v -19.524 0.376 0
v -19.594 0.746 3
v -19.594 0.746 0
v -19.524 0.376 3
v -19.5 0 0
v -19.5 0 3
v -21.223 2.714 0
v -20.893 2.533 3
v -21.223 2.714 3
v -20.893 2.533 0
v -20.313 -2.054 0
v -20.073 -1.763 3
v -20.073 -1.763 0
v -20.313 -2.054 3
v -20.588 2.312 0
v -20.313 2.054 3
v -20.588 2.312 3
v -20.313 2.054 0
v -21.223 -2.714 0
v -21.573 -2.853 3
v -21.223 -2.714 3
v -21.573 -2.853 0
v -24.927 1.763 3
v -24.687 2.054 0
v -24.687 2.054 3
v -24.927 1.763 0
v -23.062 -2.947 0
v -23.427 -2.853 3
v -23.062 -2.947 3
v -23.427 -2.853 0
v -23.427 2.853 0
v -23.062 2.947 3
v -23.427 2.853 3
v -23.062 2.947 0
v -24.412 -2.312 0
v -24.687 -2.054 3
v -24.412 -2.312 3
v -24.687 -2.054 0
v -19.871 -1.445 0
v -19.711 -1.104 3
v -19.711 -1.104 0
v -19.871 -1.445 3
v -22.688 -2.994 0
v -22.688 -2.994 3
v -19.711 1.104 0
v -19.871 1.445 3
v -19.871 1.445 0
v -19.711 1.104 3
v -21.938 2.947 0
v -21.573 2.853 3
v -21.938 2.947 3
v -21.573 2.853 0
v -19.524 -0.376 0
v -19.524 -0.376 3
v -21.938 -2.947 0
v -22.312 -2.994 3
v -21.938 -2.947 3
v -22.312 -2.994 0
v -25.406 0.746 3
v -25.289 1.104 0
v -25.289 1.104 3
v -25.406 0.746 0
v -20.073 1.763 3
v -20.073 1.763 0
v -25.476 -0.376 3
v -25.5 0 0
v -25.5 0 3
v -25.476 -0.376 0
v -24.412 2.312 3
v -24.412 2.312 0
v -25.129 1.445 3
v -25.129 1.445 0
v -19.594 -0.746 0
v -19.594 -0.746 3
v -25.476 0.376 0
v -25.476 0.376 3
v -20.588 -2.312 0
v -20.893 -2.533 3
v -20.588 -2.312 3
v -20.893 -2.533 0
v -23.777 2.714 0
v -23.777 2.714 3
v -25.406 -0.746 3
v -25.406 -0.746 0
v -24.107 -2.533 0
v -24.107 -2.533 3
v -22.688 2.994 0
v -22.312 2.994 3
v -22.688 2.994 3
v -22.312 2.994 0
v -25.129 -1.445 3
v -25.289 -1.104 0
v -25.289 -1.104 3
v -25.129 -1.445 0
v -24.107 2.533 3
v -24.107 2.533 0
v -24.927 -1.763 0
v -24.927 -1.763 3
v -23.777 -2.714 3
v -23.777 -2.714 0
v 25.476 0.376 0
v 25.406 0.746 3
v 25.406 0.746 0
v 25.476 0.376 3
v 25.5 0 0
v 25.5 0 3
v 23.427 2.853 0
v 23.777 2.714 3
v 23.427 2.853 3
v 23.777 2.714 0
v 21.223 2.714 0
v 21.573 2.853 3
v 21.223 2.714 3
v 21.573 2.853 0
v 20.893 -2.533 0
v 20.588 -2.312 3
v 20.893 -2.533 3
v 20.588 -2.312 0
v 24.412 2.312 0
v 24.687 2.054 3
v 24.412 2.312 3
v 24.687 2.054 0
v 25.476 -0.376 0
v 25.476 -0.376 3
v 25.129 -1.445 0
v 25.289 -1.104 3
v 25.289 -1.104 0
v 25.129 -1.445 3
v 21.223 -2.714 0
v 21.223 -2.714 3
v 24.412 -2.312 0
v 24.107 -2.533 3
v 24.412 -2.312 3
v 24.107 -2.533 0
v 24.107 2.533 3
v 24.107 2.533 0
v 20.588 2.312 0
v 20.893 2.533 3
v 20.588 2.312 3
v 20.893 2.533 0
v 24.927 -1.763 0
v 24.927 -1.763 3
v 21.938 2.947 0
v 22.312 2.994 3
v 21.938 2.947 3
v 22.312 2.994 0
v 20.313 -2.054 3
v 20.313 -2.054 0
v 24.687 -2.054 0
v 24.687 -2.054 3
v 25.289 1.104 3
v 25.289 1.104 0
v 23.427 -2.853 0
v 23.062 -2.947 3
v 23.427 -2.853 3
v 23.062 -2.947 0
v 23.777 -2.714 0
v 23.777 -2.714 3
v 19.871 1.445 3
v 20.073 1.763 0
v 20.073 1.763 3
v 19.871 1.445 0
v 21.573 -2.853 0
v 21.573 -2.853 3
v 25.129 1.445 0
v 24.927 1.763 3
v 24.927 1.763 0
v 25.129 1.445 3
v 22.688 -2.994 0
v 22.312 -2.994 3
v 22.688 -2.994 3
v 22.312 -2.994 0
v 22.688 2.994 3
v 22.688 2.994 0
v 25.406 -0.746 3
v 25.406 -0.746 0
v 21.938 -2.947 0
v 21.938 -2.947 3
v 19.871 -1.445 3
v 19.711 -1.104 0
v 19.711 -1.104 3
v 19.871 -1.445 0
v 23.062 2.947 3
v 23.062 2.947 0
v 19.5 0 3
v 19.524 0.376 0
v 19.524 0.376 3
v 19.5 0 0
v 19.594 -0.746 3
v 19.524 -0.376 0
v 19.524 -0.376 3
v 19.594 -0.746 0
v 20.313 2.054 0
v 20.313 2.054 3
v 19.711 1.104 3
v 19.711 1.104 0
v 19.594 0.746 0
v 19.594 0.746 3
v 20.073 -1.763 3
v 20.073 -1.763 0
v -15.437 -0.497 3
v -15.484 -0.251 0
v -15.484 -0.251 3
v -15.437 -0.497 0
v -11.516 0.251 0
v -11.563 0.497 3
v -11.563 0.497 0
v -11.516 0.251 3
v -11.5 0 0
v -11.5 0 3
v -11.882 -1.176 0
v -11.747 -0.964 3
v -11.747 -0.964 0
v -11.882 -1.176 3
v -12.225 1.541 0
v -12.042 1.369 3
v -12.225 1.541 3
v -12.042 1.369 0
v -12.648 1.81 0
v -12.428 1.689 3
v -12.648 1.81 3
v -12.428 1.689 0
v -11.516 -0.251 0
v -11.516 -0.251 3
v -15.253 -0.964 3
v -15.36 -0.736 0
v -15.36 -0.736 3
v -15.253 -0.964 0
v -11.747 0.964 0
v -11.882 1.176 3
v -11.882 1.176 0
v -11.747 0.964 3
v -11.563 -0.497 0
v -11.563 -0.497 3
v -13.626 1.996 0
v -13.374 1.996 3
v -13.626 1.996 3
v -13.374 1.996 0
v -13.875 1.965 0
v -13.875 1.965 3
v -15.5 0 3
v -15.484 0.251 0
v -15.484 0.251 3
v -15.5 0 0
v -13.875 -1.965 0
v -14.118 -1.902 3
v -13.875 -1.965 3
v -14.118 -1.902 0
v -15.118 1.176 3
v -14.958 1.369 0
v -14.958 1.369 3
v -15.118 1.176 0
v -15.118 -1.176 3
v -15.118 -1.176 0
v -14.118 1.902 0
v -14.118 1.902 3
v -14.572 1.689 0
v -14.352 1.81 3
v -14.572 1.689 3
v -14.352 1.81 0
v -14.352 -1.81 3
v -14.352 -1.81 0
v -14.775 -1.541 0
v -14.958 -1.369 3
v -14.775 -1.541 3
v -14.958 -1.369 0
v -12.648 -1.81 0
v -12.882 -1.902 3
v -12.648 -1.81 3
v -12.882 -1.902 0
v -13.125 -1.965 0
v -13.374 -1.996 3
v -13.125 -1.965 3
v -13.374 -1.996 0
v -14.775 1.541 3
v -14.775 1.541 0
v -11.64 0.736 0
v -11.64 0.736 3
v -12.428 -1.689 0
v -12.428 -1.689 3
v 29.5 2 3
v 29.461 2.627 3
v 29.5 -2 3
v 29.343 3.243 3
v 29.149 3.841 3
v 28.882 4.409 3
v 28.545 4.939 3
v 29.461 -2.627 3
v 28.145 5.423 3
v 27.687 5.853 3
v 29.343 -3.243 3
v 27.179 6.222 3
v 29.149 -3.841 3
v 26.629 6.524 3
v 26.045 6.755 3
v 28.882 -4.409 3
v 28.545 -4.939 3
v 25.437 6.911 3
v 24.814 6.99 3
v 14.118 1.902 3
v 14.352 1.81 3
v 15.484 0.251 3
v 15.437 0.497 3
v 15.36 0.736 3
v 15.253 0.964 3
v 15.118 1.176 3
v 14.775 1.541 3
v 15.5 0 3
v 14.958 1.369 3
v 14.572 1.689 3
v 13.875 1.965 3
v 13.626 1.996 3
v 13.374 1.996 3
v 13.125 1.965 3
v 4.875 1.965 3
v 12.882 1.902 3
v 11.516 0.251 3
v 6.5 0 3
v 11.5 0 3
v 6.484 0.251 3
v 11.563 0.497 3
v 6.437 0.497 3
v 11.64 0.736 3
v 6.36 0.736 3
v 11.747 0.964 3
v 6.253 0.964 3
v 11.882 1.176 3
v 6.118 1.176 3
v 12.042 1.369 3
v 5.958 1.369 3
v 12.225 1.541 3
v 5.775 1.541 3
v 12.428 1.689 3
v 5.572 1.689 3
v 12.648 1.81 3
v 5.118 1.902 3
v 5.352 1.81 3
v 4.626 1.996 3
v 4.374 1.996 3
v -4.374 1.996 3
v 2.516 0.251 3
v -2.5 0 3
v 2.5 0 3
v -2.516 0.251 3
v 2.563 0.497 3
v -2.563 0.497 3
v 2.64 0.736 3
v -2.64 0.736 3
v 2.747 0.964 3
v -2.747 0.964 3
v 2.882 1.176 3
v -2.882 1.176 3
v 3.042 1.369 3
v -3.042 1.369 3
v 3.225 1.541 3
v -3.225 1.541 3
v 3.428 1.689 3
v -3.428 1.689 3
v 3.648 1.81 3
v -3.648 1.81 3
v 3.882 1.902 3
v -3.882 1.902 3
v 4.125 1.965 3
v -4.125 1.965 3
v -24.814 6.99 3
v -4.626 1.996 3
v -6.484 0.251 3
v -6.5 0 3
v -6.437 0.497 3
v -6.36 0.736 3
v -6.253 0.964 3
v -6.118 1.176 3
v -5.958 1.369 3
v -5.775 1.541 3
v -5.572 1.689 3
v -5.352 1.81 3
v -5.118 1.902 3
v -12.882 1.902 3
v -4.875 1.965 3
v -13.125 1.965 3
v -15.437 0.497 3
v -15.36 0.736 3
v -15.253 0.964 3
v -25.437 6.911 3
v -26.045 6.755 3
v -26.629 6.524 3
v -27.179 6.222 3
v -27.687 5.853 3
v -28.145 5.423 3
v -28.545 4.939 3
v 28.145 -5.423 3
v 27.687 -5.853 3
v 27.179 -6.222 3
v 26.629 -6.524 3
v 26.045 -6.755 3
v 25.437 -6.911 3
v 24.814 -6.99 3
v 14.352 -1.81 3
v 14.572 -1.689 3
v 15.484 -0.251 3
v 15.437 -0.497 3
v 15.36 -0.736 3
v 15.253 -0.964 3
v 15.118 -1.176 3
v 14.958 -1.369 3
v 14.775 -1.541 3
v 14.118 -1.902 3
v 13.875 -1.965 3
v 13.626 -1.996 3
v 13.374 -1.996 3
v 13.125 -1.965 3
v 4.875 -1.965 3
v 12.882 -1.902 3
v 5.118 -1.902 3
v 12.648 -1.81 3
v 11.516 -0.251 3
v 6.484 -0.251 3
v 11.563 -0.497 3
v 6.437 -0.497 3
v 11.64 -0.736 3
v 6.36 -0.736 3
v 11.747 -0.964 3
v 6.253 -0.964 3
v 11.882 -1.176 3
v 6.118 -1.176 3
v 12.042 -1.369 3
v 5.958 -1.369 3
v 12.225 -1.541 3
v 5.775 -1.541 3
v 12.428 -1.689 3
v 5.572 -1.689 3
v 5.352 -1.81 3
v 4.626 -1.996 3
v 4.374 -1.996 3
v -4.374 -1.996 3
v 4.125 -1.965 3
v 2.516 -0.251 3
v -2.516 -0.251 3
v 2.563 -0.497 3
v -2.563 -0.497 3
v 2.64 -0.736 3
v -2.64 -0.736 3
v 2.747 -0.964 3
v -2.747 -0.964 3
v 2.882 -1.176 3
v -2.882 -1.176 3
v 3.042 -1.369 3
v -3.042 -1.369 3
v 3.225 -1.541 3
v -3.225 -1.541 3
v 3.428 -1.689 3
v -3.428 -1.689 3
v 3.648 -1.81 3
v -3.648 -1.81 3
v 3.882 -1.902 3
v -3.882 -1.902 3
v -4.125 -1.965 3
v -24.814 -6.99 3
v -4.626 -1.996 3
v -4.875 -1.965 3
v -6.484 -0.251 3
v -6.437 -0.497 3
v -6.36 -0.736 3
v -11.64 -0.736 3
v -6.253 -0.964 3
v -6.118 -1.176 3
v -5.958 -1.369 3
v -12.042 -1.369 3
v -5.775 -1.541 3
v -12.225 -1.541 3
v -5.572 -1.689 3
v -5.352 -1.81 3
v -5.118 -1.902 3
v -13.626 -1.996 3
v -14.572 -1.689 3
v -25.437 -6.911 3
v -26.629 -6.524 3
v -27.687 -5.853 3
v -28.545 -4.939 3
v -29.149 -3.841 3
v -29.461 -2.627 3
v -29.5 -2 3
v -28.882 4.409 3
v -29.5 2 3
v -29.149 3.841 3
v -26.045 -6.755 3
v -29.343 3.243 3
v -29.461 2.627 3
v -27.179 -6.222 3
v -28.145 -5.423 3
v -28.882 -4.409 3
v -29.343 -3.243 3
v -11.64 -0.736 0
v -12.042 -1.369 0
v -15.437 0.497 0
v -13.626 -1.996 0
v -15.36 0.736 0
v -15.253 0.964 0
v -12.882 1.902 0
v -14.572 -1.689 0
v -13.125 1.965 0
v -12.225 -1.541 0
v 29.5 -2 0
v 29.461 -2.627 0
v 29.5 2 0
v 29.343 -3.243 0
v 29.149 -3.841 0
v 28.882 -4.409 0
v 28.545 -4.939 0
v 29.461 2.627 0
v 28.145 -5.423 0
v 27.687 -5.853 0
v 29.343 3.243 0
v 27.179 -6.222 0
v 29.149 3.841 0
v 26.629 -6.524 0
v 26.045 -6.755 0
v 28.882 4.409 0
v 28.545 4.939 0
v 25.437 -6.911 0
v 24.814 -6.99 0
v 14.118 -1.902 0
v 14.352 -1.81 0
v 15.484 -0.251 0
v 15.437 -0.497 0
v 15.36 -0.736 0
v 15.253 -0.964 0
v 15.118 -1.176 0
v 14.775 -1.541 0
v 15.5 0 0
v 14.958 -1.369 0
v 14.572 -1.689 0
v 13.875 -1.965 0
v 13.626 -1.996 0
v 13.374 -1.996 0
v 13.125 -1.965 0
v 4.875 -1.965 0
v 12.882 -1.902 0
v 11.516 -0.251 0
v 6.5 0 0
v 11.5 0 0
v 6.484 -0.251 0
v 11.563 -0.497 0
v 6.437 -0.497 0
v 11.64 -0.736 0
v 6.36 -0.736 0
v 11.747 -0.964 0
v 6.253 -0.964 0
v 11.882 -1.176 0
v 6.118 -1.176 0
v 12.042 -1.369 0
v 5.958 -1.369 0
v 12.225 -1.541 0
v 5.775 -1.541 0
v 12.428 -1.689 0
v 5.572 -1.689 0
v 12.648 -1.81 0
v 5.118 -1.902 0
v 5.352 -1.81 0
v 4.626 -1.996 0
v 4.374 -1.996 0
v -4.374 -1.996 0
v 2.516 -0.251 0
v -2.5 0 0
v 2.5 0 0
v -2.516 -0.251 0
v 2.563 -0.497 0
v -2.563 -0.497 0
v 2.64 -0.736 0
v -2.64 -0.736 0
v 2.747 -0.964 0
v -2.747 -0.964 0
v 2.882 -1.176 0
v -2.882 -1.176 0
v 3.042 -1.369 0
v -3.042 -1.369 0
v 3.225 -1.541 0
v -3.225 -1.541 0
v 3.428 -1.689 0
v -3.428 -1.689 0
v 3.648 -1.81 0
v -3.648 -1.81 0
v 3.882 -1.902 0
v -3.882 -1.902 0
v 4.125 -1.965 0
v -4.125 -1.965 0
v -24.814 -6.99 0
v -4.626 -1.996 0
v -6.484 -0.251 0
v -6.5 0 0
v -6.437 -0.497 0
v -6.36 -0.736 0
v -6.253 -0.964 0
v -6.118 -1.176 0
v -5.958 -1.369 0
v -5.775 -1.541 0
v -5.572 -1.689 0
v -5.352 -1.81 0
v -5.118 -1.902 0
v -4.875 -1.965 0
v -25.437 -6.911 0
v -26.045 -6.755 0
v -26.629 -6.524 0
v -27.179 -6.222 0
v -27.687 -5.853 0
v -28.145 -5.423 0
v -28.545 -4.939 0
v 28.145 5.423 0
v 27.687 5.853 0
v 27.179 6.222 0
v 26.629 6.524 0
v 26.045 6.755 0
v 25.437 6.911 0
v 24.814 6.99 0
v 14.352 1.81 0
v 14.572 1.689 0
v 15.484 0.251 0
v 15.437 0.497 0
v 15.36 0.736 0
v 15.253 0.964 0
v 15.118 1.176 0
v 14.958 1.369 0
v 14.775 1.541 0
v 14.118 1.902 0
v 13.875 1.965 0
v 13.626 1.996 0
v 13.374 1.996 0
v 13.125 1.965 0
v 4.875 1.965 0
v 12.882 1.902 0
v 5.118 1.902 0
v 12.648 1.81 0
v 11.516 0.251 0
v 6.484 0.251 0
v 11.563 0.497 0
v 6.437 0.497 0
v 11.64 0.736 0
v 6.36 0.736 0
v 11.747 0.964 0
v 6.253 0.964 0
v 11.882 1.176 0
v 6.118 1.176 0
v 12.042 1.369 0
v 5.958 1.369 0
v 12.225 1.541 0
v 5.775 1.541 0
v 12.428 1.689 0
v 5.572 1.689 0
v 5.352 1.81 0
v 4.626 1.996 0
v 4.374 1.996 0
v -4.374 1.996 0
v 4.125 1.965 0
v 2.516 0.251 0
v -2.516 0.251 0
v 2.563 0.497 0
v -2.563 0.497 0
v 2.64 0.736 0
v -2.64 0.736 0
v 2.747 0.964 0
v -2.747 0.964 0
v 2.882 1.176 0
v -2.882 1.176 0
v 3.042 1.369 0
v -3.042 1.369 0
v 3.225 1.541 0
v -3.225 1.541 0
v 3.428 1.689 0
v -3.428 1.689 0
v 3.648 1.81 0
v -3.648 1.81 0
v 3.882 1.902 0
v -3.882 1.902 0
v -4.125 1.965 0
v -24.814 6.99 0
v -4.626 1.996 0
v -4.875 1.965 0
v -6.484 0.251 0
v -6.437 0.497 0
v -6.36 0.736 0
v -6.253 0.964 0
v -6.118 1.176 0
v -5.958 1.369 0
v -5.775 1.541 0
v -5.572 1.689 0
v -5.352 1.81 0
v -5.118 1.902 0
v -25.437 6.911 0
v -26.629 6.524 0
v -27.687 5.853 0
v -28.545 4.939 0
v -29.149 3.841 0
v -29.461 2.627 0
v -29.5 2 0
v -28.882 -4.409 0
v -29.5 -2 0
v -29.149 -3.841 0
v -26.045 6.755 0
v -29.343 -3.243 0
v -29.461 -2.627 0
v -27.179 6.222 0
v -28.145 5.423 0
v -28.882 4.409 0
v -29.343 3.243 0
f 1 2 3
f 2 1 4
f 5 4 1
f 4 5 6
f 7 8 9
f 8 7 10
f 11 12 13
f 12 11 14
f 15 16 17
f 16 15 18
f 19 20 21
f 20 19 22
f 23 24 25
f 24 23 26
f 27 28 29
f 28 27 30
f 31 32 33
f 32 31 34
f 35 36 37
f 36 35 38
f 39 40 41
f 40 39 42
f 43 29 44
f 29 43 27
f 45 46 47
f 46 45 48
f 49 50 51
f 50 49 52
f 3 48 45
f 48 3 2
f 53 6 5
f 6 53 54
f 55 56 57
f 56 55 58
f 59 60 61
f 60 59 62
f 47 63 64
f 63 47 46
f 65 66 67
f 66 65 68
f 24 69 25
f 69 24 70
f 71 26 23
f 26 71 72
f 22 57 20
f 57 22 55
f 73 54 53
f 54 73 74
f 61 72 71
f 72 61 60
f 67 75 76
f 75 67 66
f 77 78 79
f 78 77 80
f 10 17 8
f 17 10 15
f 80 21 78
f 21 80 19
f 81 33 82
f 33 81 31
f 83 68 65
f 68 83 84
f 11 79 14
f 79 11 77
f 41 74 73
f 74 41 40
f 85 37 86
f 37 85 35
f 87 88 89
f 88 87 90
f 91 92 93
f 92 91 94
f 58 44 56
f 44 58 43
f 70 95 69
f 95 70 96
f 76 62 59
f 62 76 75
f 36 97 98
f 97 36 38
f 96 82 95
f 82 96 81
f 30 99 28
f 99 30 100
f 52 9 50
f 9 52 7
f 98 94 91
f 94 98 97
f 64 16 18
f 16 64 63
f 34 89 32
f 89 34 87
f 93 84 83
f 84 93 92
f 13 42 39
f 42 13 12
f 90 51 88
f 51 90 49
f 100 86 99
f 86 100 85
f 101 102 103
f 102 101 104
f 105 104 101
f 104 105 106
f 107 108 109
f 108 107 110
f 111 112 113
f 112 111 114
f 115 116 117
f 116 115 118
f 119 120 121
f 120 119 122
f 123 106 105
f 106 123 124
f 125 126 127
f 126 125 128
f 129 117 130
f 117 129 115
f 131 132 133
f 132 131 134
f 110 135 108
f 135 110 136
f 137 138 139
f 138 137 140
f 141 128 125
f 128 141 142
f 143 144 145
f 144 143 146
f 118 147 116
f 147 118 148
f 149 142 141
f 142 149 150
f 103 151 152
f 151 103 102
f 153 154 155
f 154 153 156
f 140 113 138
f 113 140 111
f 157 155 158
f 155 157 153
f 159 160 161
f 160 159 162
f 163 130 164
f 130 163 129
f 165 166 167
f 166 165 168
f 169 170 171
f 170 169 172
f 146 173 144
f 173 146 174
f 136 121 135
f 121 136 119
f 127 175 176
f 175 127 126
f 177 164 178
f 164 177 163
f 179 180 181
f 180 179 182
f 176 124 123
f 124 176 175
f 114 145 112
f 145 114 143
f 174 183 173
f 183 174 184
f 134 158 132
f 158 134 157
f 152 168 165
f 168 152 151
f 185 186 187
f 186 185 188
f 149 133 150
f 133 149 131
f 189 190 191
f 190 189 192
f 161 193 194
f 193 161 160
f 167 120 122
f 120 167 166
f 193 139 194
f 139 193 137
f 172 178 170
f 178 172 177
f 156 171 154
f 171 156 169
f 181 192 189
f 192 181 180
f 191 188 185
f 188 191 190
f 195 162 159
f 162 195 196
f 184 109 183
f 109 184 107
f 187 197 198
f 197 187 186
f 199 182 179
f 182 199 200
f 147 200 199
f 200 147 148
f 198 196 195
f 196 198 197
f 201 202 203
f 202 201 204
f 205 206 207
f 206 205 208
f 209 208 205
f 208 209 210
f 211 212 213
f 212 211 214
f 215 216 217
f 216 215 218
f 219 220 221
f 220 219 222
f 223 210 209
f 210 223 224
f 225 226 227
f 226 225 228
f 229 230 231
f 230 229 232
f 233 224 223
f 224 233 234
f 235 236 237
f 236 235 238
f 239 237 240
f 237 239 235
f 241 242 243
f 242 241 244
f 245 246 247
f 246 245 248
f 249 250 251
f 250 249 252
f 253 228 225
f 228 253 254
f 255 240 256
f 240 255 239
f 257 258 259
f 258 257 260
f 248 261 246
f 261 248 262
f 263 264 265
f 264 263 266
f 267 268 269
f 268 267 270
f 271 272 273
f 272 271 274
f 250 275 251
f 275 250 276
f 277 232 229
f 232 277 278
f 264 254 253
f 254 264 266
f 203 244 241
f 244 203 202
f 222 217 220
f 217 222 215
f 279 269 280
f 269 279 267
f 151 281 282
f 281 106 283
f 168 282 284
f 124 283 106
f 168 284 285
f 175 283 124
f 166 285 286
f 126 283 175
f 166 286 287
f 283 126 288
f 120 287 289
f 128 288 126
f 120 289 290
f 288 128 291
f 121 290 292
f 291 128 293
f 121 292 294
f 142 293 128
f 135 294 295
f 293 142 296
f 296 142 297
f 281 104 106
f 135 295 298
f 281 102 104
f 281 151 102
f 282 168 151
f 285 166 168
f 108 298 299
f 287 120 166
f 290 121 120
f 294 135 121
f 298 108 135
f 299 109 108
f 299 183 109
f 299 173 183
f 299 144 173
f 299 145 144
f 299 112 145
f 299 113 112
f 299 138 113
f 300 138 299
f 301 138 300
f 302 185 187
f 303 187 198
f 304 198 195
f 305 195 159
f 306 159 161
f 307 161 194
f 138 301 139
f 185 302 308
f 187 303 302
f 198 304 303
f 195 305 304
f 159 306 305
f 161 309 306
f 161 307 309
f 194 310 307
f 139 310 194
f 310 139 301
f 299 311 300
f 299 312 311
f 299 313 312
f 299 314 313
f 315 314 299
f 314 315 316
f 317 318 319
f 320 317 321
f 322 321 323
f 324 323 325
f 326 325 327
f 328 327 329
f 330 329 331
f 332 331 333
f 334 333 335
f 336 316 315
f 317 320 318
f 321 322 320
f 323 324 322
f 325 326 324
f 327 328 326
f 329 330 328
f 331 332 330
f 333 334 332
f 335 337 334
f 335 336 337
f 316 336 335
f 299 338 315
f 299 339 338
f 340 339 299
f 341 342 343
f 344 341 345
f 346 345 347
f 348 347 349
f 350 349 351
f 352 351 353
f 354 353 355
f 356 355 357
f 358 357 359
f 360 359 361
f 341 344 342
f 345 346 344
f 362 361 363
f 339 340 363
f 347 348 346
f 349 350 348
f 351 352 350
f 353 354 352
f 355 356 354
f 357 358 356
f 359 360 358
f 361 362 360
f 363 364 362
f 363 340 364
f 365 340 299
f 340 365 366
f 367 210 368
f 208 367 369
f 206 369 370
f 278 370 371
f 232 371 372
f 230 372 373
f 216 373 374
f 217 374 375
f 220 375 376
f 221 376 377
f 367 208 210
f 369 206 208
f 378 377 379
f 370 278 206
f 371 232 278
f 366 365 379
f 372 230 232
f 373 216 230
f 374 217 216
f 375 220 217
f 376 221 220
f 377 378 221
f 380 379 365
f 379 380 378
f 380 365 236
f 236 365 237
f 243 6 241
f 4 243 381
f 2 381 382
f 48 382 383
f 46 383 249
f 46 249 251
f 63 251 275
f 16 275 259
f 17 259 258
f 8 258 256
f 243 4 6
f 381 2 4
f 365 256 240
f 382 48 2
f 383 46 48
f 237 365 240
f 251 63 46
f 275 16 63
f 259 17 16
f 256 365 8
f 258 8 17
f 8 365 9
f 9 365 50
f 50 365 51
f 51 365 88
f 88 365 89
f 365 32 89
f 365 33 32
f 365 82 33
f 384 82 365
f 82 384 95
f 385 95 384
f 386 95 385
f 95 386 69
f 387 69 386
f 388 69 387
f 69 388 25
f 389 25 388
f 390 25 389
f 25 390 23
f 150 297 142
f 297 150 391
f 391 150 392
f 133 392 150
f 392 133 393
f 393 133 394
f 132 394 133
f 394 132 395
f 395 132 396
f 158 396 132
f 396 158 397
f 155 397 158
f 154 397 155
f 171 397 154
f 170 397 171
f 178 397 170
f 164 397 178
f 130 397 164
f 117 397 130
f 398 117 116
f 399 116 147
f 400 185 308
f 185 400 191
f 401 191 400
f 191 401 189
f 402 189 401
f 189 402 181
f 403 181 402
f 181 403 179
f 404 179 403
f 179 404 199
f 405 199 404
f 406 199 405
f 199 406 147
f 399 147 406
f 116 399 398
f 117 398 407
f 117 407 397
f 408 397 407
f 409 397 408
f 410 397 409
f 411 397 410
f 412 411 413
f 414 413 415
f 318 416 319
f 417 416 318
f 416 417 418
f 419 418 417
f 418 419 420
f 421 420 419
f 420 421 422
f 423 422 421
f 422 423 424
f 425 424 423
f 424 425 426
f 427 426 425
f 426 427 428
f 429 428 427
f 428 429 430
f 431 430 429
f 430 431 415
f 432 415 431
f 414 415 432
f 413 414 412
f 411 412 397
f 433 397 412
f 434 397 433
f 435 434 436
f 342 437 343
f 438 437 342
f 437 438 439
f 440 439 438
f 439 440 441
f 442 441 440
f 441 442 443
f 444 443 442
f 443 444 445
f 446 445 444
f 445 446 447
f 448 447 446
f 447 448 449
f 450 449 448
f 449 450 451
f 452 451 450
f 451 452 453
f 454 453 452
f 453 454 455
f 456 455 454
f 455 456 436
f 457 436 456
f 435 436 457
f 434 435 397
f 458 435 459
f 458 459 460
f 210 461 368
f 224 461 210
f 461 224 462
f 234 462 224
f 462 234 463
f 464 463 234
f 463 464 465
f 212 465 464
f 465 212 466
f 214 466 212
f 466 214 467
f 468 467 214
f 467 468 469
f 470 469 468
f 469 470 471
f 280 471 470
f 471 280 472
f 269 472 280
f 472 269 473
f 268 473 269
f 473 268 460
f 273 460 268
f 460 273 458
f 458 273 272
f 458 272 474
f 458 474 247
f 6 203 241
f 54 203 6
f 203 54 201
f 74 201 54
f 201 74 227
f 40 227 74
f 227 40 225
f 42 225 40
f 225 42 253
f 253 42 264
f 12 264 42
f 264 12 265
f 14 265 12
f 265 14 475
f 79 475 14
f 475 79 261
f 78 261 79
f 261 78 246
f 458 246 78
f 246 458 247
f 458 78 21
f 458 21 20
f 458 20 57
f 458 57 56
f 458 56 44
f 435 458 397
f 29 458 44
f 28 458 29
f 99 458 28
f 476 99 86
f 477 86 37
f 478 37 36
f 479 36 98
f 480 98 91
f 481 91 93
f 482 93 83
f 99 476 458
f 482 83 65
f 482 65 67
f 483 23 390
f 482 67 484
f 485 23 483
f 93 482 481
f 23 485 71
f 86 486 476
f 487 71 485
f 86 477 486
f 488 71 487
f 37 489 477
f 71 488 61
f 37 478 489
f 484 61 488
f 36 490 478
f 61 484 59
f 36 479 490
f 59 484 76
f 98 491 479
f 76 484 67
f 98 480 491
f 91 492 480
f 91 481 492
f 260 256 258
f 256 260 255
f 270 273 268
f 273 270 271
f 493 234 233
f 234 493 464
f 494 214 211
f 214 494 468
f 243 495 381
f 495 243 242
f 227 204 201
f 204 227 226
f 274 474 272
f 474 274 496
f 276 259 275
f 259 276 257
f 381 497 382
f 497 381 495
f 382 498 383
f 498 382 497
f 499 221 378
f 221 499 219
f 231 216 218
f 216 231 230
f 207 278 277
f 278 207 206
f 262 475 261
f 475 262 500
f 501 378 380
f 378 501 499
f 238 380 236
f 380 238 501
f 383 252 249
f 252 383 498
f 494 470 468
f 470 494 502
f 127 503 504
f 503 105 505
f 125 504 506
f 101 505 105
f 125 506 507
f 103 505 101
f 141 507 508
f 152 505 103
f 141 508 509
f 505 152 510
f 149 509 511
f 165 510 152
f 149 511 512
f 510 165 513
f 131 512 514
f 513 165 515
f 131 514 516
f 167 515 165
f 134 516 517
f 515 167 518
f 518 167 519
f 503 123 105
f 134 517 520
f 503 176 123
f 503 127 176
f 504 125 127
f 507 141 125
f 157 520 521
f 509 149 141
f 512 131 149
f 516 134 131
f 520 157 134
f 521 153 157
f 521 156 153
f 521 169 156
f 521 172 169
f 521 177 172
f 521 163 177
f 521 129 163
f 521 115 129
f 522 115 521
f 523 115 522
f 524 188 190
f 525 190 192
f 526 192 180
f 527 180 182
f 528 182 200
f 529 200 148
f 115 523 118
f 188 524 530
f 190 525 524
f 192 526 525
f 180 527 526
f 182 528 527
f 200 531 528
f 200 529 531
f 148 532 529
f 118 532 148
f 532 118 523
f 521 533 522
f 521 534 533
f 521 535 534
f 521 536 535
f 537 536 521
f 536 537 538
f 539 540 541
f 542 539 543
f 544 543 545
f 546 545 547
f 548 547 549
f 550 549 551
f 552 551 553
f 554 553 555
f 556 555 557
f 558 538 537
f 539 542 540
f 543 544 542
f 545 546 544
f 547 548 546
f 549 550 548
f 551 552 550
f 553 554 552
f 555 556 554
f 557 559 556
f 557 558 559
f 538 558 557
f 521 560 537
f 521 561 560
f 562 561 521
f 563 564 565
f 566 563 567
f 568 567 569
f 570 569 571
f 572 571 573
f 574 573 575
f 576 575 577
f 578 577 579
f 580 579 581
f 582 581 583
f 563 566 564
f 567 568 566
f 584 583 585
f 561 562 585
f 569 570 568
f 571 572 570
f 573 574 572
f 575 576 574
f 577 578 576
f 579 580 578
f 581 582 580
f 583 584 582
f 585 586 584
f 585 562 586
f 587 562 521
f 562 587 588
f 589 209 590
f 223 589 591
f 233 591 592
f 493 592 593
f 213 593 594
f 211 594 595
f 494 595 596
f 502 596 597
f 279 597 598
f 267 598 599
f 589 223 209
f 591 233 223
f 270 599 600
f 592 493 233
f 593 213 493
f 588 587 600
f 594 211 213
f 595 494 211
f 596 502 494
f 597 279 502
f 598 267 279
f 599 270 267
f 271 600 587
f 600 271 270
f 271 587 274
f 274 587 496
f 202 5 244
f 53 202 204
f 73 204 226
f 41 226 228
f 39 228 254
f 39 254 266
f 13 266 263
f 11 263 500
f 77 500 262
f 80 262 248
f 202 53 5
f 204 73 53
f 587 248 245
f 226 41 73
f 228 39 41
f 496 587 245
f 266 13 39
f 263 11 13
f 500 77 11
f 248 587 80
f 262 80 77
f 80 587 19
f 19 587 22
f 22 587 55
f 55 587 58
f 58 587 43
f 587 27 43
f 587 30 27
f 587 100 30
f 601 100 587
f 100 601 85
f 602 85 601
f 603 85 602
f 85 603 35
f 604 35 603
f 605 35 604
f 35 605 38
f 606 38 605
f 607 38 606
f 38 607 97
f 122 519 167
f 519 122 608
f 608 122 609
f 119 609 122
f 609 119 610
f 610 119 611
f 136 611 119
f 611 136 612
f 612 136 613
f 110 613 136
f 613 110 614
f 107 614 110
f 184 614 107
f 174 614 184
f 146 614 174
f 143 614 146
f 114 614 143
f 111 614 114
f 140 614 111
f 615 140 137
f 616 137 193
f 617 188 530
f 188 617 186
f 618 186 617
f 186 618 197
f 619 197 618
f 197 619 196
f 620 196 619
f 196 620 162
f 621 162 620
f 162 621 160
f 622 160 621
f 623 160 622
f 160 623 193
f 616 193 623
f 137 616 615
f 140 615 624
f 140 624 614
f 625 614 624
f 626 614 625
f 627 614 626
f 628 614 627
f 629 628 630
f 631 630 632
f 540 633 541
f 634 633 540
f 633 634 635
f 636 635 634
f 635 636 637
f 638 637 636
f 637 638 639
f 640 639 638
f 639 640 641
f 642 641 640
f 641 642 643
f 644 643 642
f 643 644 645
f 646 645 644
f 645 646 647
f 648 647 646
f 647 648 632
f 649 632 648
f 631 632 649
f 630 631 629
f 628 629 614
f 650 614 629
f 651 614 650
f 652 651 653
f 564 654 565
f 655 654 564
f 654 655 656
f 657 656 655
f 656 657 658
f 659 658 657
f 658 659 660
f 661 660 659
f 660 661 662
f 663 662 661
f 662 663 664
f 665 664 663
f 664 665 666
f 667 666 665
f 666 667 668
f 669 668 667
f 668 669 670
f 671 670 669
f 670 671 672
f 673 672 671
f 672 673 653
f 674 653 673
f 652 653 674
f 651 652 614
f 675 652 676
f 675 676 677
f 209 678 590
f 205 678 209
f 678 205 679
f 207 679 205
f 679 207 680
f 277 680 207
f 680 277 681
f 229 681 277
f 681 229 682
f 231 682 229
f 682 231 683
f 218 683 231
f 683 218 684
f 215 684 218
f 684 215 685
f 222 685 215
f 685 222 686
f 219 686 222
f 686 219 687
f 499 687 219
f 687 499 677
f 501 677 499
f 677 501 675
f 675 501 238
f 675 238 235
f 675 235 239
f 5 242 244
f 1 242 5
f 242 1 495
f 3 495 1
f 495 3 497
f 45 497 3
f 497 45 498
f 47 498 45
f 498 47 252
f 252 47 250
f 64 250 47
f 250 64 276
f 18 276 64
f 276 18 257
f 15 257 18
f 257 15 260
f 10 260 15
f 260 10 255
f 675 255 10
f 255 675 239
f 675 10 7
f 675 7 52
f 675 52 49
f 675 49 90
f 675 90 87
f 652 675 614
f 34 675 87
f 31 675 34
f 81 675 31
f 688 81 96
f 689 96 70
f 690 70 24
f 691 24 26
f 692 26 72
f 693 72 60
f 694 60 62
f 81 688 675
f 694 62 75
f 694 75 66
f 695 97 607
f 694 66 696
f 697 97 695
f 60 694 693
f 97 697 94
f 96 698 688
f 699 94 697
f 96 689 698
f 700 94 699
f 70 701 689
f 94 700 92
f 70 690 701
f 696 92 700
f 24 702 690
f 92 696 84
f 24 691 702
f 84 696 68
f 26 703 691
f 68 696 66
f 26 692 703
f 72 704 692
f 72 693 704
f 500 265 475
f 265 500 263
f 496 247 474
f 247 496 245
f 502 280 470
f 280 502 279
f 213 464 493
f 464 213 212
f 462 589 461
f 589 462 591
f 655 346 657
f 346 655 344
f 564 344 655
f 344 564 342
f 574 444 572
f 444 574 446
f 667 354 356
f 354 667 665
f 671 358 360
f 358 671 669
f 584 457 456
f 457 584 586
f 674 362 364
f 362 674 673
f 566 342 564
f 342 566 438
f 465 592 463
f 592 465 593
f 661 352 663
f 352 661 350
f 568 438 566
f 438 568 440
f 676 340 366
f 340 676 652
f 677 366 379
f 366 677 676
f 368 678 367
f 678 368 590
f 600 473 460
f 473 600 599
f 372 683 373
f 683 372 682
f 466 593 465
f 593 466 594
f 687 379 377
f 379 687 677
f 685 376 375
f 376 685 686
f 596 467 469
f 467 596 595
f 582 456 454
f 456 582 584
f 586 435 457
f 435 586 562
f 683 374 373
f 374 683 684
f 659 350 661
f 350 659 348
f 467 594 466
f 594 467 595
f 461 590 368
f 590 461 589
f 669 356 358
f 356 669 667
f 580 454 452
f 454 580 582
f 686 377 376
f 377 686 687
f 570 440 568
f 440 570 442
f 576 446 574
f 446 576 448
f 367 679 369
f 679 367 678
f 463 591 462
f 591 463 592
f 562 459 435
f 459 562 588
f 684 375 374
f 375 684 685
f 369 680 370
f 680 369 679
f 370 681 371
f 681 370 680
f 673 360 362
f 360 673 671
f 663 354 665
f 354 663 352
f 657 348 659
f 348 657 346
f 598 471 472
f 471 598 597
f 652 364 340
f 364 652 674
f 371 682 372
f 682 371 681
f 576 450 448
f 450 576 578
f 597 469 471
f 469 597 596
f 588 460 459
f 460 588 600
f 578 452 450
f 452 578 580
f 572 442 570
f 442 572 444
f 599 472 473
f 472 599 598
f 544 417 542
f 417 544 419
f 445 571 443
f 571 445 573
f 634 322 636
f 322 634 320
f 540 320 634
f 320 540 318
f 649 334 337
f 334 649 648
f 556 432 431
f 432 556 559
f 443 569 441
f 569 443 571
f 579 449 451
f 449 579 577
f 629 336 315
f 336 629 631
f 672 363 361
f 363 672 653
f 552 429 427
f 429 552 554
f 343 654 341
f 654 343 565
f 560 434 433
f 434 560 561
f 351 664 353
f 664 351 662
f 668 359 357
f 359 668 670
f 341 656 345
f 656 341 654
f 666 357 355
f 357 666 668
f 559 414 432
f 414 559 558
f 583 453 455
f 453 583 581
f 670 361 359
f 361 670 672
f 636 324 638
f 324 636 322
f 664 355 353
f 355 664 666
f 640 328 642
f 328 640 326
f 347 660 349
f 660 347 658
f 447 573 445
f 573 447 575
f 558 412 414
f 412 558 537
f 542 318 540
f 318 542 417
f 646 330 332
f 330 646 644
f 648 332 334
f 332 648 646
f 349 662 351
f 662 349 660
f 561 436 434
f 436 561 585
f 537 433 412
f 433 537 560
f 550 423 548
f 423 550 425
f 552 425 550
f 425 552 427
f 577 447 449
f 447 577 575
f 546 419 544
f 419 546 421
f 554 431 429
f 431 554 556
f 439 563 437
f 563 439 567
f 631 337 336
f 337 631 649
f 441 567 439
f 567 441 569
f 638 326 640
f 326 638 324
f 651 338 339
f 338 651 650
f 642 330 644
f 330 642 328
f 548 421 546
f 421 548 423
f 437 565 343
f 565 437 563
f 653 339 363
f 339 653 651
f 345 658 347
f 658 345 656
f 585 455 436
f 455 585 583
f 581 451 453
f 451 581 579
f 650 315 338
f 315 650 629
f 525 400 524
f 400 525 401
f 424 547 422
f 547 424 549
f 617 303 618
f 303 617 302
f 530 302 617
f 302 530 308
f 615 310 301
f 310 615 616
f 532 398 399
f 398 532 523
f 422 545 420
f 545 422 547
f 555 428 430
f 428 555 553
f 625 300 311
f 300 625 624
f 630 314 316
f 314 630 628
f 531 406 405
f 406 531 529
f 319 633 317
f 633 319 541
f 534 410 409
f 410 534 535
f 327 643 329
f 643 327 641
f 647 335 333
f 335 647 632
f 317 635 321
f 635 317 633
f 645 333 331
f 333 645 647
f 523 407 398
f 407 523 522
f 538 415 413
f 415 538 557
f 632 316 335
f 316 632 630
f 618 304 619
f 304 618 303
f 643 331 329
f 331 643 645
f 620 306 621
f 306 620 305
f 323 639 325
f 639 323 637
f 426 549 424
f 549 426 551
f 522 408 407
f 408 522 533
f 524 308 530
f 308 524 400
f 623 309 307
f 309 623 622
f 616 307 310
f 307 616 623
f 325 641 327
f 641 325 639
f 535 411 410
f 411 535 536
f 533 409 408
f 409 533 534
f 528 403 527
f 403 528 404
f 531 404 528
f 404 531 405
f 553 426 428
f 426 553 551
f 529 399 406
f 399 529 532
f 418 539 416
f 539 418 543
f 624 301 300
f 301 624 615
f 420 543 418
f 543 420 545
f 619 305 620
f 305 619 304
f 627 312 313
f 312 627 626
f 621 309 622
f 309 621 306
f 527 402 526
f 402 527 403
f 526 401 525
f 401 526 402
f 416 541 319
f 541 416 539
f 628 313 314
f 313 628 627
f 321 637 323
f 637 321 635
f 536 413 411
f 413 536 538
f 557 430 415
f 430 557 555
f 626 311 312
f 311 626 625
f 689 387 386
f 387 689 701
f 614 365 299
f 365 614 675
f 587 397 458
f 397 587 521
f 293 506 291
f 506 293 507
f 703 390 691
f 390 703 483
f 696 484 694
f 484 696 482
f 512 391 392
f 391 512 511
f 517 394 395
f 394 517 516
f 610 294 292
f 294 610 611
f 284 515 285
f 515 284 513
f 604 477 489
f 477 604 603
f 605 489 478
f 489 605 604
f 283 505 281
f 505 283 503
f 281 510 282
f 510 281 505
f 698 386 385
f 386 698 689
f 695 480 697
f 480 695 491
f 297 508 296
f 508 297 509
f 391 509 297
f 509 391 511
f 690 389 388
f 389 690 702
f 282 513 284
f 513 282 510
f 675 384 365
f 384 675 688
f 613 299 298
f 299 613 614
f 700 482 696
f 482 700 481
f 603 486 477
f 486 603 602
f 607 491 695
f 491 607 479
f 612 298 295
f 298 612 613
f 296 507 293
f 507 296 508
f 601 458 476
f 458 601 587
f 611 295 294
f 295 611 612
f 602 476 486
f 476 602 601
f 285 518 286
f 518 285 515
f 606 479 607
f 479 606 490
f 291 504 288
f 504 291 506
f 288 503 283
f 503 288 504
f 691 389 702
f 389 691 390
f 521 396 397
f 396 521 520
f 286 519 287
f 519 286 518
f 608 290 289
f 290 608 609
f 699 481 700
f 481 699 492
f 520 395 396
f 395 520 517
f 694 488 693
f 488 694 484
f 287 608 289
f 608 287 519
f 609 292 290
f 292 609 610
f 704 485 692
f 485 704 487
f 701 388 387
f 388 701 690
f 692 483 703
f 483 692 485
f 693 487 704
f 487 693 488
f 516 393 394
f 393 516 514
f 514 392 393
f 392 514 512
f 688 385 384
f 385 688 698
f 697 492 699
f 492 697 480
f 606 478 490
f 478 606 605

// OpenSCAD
$fn = 50;


difference() {
	union() {
		hull() {
			translate(v = [-24.5000000000, 2.0000000000, 0]) {
				cylinder(h = 3, r = 5);
			}
			translate(v = [24.5000000000, 2.0000000000, 0]) {
				cylinder(h = 3, r = 5);
			}
			translate(v = [-24.5000000000, -2.0000000000, 0]) {
				cylinder(h = 3, r = 5);
			}
			translate(v = [24.5000000000, -2.0000000000, 0]) {
				cylinder(h = 3, r = 5);
			}
		}
	}
	union() {
		#translate(v = [-22.5000000000, 0.0000000000, 0]) {
			cylinder(h = 3, r = 3.0000000000);
		}
		#translate(v = [22.5000000000, 0.0000000000, 0]) {
			cylinder(h = 3, r = 3.0000000000);
		}
		#translate(v = [-22.5000000000, 0.0000000000, -100.0000000000]) {
			cylinder(h = 200, r = 3.0000000000);
		}
		#translate(v = [-22.5000000000, 0.0000000000, -100.0000000000]) {
			cylinder(h = 200, r = 3.0000000000);
		}
		#translate(v = [22.5000000000, 0.0000000000, -100.0000000000]) {
			cylinder(h = 200, r = 3.0000000000);
		}
		#translate(v = [22.5000000000, 0.0000000000, -100.0000000000]) {
			cylinder(h = 200, r = 3.0000000000);
		}
		#translate(v = [-22.5000000000, 0.0000000000, 0]) {
			cylinder(h = 3, r = 1.5000000000);
		}
		#translate(v = [22.5000000000, 0.0000000000, 0]) {
			cylinder(h = 3, r = 1.5000000000);
		}
		#translate(v = [-22.5000000000, 0.0000000000, 0]) {
			cylinder(h = 3, r = 1.5000000000);
		}
		#translate(v = [22.5000000000, 0.0000000000, 0]) {
			cylinder(h = 3, r = 1.5000000000);
		}
		#translate(v = [-22.5000000000, 0.0000000000, 0]) {
			cylinder(h = 3, r = 1.5000000000);
		}
		#translate(v = [22.5000000000, 0.0000000000, 0]) {
			cylinder(h = 3, r = 1.5000000000);
		}
		#translate(v = [-13.5000000000, 0, 0]) {
			cylinder(h = 3, r = 2.0000000000);
		}
		#translate(v = [-4.5000000000, 0, 0]) {
			cylinder(h = 3, r = 2.0000000000);
		}
		#translate(v = [4.5000000000, 0, 0]) {
			cylinder(h = 3, r = 2.0000000000);
		}
		#translate(v = [13.5000000000, 0, 0]) {
			cylinder(h = 3, r = 2.0000000000);
		}
	}
}
